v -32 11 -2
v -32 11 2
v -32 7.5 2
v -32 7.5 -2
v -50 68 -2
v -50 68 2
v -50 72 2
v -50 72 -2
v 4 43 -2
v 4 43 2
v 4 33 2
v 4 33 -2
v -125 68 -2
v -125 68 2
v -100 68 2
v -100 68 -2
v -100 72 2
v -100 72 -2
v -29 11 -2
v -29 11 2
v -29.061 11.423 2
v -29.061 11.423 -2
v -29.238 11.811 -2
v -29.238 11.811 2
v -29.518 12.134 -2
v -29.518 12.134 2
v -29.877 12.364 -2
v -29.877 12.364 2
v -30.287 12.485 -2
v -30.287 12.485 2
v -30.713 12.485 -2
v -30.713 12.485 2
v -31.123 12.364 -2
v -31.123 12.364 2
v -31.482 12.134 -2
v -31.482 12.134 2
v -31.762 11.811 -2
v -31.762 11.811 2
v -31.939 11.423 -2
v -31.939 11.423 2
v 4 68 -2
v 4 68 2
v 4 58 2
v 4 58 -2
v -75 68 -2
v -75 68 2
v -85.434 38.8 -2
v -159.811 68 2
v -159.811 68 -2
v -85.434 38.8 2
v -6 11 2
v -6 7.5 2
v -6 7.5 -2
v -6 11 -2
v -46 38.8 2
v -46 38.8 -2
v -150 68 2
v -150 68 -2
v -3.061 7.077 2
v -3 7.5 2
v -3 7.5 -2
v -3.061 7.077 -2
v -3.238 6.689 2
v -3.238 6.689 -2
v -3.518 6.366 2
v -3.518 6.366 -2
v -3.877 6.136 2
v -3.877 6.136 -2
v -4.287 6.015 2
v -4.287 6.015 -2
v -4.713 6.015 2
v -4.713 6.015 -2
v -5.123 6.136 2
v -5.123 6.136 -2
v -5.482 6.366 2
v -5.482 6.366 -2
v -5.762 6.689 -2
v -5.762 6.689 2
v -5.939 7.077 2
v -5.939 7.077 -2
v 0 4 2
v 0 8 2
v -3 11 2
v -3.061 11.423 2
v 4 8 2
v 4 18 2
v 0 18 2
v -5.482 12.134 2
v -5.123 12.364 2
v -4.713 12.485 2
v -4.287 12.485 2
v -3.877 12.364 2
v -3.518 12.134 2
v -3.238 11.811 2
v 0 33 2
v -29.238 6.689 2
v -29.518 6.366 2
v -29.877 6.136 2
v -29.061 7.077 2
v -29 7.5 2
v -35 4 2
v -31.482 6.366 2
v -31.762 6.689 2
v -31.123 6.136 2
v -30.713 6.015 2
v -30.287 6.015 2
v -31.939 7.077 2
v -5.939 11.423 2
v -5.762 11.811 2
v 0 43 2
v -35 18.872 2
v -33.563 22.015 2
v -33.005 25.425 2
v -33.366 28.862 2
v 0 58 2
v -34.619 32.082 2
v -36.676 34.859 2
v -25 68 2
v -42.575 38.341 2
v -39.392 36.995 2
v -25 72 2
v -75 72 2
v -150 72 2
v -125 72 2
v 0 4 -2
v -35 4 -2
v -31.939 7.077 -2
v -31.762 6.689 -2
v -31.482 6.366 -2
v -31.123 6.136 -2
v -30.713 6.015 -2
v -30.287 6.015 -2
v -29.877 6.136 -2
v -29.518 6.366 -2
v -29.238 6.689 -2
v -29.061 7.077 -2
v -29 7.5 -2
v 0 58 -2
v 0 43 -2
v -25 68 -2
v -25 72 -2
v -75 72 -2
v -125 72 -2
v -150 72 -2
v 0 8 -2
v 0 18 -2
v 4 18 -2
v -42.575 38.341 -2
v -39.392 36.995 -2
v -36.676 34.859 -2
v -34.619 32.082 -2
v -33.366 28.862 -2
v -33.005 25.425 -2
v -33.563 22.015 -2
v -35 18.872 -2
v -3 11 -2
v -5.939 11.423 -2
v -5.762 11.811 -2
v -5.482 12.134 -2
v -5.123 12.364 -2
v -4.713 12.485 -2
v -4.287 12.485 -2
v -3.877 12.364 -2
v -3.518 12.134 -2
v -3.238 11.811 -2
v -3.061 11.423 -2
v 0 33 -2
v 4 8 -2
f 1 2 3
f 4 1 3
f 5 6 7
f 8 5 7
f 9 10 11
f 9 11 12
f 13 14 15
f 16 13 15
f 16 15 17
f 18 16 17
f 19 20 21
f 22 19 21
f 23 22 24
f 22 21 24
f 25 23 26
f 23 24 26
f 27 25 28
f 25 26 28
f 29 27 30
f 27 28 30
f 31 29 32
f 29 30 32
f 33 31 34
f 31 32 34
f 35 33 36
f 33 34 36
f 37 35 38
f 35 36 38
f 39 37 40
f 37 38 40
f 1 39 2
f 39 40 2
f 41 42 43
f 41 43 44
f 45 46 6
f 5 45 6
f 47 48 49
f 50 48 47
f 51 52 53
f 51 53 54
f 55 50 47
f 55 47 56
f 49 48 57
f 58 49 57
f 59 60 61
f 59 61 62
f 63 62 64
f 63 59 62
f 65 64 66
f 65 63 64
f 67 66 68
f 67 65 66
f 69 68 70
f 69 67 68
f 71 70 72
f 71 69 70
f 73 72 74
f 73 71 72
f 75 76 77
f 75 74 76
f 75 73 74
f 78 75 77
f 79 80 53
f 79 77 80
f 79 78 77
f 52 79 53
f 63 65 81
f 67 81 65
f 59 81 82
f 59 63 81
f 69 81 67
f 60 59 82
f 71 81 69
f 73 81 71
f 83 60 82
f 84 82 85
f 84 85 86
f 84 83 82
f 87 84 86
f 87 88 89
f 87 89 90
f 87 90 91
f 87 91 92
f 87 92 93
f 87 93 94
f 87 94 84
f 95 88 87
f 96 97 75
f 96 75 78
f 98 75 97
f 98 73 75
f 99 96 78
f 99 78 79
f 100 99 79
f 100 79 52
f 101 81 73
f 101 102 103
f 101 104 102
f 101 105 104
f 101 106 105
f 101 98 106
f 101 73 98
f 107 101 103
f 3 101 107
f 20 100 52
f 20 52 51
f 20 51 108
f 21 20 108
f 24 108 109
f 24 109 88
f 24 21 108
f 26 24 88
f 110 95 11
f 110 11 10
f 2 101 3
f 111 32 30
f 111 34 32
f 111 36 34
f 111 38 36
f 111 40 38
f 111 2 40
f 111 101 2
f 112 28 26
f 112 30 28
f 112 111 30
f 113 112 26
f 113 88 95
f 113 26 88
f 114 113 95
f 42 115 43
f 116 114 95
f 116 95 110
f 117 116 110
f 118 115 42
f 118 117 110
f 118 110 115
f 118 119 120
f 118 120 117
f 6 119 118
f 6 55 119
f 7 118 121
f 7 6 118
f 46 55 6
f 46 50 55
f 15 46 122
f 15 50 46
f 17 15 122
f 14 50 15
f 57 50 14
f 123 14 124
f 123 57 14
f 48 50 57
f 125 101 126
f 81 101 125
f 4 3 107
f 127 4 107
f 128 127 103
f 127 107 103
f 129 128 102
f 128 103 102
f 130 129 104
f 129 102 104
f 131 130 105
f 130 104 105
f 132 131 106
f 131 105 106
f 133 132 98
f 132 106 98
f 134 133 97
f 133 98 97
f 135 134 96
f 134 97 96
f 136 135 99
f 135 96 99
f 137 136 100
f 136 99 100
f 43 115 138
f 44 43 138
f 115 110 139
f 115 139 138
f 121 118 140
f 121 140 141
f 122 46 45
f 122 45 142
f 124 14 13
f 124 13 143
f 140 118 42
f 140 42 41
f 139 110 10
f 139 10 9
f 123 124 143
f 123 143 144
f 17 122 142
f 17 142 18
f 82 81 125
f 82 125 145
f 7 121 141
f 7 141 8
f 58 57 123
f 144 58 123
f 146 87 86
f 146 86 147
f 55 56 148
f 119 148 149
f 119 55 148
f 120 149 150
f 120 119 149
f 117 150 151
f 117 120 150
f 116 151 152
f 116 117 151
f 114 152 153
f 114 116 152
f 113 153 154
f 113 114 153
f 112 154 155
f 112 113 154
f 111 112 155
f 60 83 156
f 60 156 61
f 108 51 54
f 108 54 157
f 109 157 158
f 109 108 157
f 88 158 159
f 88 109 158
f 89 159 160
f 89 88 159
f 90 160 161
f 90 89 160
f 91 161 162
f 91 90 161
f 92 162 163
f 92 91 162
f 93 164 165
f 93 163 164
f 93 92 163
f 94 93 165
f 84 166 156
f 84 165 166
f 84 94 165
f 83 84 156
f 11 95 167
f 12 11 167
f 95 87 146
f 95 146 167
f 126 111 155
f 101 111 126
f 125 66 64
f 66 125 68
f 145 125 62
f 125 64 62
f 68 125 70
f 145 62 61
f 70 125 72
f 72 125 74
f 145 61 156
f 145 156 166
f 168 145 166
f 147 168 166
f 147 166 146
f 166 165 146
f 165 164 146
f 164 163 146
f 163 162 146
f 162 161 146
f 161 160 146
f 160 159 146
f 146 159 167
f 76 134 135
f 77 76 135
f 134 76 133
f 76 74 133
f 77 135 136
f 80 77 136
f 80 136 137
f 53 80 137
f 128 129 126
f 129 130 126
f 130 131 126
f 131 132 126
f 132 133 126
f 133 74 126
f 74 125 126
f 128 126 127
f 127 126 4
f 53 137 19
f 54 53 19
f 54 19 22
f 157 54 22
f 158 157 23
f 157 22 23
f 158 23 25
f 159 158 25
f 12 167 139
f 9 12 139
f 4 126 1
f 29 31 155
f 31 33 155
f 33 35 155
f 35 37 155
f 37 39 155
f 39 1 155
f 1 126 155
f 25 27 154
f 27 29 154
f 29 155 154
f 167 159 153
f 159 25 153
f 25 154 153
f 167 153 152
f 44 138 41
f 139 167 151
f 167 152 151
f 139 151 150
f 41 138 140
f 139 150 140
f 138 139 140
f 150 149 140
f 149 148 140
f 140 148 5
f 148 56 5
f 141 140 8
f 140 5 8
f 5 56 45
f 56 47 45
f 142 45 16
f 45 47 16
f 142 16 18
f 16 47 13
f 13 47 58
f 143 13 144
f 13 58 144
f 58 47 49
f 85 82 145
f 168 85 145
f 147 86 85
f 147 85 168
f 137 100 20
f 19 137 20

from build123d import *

# Parameters (mm, degrees)
BOSS_EXTRUDE1_DEPTH = 2
CUT_EXTRUDE1_REACH  = 186.662
SKETCH3_W           = 25
SKETCH3_H           = 4
CUT_EXTRUDE2_DEPTH  = 185.661853126
SKETCH4_W           = 4
SKETCH4_H           = 10
BOSS_EXTRUDE2_DEPTH = 4
CUT_EXTRUDE3_DEPTH  = 176.327288924


with BuildPart() as part:
    # Sketch1 → Boss-Extrude1 (new, symmetric)
    with BuildSketch(Plane.XY):
        Polygon((0, 4), (0, 72), (-170, 72), (-35, 19), (-35, 4), align=None)
    extrude(amount=BOSS_EXTRUDE1_DEPTH, both=True)

    # Sketch2 → Cut-Extrude1 (cut, up to next)
    with BuildSketch(Plane.XY.offset(2), mode=Mode.PRIVATE) as cut_extrude1_sk1:
        with BuildLine():
            Line((-3, 11), (-3, 7.5))
            ThreePointArc((-3, 7.5), (-4.5, 6), (-6, 7.5))
            Line((-6, 7.5), (-6, 11))
            ThreePointArc((-6, 11), (-4.5, 12.5), (-3, 11))
        make_face()
    cut_extrude1_tool1 = extrude(cut_extrude1_sk1.sketch, amount=-CUT_EXTRUDE1_REACH, mode=Mode.PRIVATE) & part.part
    # Sketch2 → Cut-Extrude1 (cut, up to next)
    with BuildSketch(Plane.XY.offset(2), mode=Mode.PRIVATE) as cut_extrude1_sk2:
        with BuildLine():
            Line((-32, 11), (-32, 7.5))
            ThreePointArc((-32, 7.5), (-30.5, 6), (-29, 7.5))
            Line((-29, 7.5), (-29, 11))
            ThreePointArc((-29, 11), (-30.5, 12.5), (-32, 11))
        make_face()
    cut_extrude1_tool2 = extrude(cut_extrude1_sk2.sketch, amount=-CUT_EXTRUDE1_REACH, mode=Mode.PRIVATE) & part.part
    add(cut_extrude1_tool1.solids().sort_by_distance((-4.5, 9.25, 2))[0], mode=Mode.SUBTRACT)
    add(cut_extrude1_tool2.solids().sort_by_distance((-30.5, 9.25, 2))[0], mode=Mode.SUBTRACT)

    # Sketch3 → Cut-Extrude2 (cut, through all)
    with BuildSketch(Plane.XY.offset(2)):
        with Locations((-62.5, 70)):
            Rectangle(SKETCH3_W, SKETCH3_H)
        with Locations((-12.5, 70)):
            Rectangle(SKETCH3_W, SKETCH3_H)
        with Locations((-112.5, 70)):
            Rectangle(SKETCH3_W, SKETCH3_H)
        with Locations((-162.5, 70)):
            Rectangle(SKETCH3_W, SKETCH3_H)
        with Locations((-212.5, 70)):
            Rectangle(SKETCH3_W, SKETCH3_H)
        with Locations((-262.5, 70)):
            Rectangle(SKETCH3_W, SKETCH3_H)
        with Locations((-312.5, 70)):
            Rectangle(SKETCH3_W, SKETCH3_H)
        with Locations((-362.5, 70)):
            Rectangle(SKETCH3_W, SKETCH3_H)
        with Locations((-412.5, 70)):
            Rectangle(SKETCH3_W, SKETCH3_H)
        with Locations((-462.5, 70)):
            Rectangle(SKETCH3_W, SKETCH3_H)
    extrude(amount=-CUT_EXTRUDE2_DEPTH, mode=Mode.SUBTRACT)

    # Sketch4 → Boss-Extrude2 (add)
    with BuildSketch(Plane(origin=(0, 0, 0), x_dir=(0, 0, -1), z_dir=(1, 0, 0))):
        with Locations((0, 63)):
            Rectangle(SKETCH4_W, SKETCH4_H)
        with Locations((0, 38)):
            Rectangle(SKETCH4_W, SKETCH4_H)
        with Locations((0, 13)):
            Rectangle(SKETCH4_W, SKETCH4_H)
    extrude(amount=BOSS_EXTRUDE2_DEPTH)

    # Sketch5 → Cut-Extrude3 (cut, through all)
    with BuildSketch(Plane.XY.offset(2)):
        with BuildLine():
            Line((-85.433962264, 38.8), (-46, 38.8))
            ThreePointArc((-46, 38.8), (-33, 25.8), (-46, 12.8))
            Line((-46, 12.8), (-85.433962264, 12.8))
            ThreePointArc((-85.433962264, 12.8), (-98.433962264, 25.8), (-85.433962264, 38.8))
        make_face()
    extrude(amount=-CUT_EXTRUDE3_DEPTH, mode=Mode.SUBTRACT)


solid = part.part
